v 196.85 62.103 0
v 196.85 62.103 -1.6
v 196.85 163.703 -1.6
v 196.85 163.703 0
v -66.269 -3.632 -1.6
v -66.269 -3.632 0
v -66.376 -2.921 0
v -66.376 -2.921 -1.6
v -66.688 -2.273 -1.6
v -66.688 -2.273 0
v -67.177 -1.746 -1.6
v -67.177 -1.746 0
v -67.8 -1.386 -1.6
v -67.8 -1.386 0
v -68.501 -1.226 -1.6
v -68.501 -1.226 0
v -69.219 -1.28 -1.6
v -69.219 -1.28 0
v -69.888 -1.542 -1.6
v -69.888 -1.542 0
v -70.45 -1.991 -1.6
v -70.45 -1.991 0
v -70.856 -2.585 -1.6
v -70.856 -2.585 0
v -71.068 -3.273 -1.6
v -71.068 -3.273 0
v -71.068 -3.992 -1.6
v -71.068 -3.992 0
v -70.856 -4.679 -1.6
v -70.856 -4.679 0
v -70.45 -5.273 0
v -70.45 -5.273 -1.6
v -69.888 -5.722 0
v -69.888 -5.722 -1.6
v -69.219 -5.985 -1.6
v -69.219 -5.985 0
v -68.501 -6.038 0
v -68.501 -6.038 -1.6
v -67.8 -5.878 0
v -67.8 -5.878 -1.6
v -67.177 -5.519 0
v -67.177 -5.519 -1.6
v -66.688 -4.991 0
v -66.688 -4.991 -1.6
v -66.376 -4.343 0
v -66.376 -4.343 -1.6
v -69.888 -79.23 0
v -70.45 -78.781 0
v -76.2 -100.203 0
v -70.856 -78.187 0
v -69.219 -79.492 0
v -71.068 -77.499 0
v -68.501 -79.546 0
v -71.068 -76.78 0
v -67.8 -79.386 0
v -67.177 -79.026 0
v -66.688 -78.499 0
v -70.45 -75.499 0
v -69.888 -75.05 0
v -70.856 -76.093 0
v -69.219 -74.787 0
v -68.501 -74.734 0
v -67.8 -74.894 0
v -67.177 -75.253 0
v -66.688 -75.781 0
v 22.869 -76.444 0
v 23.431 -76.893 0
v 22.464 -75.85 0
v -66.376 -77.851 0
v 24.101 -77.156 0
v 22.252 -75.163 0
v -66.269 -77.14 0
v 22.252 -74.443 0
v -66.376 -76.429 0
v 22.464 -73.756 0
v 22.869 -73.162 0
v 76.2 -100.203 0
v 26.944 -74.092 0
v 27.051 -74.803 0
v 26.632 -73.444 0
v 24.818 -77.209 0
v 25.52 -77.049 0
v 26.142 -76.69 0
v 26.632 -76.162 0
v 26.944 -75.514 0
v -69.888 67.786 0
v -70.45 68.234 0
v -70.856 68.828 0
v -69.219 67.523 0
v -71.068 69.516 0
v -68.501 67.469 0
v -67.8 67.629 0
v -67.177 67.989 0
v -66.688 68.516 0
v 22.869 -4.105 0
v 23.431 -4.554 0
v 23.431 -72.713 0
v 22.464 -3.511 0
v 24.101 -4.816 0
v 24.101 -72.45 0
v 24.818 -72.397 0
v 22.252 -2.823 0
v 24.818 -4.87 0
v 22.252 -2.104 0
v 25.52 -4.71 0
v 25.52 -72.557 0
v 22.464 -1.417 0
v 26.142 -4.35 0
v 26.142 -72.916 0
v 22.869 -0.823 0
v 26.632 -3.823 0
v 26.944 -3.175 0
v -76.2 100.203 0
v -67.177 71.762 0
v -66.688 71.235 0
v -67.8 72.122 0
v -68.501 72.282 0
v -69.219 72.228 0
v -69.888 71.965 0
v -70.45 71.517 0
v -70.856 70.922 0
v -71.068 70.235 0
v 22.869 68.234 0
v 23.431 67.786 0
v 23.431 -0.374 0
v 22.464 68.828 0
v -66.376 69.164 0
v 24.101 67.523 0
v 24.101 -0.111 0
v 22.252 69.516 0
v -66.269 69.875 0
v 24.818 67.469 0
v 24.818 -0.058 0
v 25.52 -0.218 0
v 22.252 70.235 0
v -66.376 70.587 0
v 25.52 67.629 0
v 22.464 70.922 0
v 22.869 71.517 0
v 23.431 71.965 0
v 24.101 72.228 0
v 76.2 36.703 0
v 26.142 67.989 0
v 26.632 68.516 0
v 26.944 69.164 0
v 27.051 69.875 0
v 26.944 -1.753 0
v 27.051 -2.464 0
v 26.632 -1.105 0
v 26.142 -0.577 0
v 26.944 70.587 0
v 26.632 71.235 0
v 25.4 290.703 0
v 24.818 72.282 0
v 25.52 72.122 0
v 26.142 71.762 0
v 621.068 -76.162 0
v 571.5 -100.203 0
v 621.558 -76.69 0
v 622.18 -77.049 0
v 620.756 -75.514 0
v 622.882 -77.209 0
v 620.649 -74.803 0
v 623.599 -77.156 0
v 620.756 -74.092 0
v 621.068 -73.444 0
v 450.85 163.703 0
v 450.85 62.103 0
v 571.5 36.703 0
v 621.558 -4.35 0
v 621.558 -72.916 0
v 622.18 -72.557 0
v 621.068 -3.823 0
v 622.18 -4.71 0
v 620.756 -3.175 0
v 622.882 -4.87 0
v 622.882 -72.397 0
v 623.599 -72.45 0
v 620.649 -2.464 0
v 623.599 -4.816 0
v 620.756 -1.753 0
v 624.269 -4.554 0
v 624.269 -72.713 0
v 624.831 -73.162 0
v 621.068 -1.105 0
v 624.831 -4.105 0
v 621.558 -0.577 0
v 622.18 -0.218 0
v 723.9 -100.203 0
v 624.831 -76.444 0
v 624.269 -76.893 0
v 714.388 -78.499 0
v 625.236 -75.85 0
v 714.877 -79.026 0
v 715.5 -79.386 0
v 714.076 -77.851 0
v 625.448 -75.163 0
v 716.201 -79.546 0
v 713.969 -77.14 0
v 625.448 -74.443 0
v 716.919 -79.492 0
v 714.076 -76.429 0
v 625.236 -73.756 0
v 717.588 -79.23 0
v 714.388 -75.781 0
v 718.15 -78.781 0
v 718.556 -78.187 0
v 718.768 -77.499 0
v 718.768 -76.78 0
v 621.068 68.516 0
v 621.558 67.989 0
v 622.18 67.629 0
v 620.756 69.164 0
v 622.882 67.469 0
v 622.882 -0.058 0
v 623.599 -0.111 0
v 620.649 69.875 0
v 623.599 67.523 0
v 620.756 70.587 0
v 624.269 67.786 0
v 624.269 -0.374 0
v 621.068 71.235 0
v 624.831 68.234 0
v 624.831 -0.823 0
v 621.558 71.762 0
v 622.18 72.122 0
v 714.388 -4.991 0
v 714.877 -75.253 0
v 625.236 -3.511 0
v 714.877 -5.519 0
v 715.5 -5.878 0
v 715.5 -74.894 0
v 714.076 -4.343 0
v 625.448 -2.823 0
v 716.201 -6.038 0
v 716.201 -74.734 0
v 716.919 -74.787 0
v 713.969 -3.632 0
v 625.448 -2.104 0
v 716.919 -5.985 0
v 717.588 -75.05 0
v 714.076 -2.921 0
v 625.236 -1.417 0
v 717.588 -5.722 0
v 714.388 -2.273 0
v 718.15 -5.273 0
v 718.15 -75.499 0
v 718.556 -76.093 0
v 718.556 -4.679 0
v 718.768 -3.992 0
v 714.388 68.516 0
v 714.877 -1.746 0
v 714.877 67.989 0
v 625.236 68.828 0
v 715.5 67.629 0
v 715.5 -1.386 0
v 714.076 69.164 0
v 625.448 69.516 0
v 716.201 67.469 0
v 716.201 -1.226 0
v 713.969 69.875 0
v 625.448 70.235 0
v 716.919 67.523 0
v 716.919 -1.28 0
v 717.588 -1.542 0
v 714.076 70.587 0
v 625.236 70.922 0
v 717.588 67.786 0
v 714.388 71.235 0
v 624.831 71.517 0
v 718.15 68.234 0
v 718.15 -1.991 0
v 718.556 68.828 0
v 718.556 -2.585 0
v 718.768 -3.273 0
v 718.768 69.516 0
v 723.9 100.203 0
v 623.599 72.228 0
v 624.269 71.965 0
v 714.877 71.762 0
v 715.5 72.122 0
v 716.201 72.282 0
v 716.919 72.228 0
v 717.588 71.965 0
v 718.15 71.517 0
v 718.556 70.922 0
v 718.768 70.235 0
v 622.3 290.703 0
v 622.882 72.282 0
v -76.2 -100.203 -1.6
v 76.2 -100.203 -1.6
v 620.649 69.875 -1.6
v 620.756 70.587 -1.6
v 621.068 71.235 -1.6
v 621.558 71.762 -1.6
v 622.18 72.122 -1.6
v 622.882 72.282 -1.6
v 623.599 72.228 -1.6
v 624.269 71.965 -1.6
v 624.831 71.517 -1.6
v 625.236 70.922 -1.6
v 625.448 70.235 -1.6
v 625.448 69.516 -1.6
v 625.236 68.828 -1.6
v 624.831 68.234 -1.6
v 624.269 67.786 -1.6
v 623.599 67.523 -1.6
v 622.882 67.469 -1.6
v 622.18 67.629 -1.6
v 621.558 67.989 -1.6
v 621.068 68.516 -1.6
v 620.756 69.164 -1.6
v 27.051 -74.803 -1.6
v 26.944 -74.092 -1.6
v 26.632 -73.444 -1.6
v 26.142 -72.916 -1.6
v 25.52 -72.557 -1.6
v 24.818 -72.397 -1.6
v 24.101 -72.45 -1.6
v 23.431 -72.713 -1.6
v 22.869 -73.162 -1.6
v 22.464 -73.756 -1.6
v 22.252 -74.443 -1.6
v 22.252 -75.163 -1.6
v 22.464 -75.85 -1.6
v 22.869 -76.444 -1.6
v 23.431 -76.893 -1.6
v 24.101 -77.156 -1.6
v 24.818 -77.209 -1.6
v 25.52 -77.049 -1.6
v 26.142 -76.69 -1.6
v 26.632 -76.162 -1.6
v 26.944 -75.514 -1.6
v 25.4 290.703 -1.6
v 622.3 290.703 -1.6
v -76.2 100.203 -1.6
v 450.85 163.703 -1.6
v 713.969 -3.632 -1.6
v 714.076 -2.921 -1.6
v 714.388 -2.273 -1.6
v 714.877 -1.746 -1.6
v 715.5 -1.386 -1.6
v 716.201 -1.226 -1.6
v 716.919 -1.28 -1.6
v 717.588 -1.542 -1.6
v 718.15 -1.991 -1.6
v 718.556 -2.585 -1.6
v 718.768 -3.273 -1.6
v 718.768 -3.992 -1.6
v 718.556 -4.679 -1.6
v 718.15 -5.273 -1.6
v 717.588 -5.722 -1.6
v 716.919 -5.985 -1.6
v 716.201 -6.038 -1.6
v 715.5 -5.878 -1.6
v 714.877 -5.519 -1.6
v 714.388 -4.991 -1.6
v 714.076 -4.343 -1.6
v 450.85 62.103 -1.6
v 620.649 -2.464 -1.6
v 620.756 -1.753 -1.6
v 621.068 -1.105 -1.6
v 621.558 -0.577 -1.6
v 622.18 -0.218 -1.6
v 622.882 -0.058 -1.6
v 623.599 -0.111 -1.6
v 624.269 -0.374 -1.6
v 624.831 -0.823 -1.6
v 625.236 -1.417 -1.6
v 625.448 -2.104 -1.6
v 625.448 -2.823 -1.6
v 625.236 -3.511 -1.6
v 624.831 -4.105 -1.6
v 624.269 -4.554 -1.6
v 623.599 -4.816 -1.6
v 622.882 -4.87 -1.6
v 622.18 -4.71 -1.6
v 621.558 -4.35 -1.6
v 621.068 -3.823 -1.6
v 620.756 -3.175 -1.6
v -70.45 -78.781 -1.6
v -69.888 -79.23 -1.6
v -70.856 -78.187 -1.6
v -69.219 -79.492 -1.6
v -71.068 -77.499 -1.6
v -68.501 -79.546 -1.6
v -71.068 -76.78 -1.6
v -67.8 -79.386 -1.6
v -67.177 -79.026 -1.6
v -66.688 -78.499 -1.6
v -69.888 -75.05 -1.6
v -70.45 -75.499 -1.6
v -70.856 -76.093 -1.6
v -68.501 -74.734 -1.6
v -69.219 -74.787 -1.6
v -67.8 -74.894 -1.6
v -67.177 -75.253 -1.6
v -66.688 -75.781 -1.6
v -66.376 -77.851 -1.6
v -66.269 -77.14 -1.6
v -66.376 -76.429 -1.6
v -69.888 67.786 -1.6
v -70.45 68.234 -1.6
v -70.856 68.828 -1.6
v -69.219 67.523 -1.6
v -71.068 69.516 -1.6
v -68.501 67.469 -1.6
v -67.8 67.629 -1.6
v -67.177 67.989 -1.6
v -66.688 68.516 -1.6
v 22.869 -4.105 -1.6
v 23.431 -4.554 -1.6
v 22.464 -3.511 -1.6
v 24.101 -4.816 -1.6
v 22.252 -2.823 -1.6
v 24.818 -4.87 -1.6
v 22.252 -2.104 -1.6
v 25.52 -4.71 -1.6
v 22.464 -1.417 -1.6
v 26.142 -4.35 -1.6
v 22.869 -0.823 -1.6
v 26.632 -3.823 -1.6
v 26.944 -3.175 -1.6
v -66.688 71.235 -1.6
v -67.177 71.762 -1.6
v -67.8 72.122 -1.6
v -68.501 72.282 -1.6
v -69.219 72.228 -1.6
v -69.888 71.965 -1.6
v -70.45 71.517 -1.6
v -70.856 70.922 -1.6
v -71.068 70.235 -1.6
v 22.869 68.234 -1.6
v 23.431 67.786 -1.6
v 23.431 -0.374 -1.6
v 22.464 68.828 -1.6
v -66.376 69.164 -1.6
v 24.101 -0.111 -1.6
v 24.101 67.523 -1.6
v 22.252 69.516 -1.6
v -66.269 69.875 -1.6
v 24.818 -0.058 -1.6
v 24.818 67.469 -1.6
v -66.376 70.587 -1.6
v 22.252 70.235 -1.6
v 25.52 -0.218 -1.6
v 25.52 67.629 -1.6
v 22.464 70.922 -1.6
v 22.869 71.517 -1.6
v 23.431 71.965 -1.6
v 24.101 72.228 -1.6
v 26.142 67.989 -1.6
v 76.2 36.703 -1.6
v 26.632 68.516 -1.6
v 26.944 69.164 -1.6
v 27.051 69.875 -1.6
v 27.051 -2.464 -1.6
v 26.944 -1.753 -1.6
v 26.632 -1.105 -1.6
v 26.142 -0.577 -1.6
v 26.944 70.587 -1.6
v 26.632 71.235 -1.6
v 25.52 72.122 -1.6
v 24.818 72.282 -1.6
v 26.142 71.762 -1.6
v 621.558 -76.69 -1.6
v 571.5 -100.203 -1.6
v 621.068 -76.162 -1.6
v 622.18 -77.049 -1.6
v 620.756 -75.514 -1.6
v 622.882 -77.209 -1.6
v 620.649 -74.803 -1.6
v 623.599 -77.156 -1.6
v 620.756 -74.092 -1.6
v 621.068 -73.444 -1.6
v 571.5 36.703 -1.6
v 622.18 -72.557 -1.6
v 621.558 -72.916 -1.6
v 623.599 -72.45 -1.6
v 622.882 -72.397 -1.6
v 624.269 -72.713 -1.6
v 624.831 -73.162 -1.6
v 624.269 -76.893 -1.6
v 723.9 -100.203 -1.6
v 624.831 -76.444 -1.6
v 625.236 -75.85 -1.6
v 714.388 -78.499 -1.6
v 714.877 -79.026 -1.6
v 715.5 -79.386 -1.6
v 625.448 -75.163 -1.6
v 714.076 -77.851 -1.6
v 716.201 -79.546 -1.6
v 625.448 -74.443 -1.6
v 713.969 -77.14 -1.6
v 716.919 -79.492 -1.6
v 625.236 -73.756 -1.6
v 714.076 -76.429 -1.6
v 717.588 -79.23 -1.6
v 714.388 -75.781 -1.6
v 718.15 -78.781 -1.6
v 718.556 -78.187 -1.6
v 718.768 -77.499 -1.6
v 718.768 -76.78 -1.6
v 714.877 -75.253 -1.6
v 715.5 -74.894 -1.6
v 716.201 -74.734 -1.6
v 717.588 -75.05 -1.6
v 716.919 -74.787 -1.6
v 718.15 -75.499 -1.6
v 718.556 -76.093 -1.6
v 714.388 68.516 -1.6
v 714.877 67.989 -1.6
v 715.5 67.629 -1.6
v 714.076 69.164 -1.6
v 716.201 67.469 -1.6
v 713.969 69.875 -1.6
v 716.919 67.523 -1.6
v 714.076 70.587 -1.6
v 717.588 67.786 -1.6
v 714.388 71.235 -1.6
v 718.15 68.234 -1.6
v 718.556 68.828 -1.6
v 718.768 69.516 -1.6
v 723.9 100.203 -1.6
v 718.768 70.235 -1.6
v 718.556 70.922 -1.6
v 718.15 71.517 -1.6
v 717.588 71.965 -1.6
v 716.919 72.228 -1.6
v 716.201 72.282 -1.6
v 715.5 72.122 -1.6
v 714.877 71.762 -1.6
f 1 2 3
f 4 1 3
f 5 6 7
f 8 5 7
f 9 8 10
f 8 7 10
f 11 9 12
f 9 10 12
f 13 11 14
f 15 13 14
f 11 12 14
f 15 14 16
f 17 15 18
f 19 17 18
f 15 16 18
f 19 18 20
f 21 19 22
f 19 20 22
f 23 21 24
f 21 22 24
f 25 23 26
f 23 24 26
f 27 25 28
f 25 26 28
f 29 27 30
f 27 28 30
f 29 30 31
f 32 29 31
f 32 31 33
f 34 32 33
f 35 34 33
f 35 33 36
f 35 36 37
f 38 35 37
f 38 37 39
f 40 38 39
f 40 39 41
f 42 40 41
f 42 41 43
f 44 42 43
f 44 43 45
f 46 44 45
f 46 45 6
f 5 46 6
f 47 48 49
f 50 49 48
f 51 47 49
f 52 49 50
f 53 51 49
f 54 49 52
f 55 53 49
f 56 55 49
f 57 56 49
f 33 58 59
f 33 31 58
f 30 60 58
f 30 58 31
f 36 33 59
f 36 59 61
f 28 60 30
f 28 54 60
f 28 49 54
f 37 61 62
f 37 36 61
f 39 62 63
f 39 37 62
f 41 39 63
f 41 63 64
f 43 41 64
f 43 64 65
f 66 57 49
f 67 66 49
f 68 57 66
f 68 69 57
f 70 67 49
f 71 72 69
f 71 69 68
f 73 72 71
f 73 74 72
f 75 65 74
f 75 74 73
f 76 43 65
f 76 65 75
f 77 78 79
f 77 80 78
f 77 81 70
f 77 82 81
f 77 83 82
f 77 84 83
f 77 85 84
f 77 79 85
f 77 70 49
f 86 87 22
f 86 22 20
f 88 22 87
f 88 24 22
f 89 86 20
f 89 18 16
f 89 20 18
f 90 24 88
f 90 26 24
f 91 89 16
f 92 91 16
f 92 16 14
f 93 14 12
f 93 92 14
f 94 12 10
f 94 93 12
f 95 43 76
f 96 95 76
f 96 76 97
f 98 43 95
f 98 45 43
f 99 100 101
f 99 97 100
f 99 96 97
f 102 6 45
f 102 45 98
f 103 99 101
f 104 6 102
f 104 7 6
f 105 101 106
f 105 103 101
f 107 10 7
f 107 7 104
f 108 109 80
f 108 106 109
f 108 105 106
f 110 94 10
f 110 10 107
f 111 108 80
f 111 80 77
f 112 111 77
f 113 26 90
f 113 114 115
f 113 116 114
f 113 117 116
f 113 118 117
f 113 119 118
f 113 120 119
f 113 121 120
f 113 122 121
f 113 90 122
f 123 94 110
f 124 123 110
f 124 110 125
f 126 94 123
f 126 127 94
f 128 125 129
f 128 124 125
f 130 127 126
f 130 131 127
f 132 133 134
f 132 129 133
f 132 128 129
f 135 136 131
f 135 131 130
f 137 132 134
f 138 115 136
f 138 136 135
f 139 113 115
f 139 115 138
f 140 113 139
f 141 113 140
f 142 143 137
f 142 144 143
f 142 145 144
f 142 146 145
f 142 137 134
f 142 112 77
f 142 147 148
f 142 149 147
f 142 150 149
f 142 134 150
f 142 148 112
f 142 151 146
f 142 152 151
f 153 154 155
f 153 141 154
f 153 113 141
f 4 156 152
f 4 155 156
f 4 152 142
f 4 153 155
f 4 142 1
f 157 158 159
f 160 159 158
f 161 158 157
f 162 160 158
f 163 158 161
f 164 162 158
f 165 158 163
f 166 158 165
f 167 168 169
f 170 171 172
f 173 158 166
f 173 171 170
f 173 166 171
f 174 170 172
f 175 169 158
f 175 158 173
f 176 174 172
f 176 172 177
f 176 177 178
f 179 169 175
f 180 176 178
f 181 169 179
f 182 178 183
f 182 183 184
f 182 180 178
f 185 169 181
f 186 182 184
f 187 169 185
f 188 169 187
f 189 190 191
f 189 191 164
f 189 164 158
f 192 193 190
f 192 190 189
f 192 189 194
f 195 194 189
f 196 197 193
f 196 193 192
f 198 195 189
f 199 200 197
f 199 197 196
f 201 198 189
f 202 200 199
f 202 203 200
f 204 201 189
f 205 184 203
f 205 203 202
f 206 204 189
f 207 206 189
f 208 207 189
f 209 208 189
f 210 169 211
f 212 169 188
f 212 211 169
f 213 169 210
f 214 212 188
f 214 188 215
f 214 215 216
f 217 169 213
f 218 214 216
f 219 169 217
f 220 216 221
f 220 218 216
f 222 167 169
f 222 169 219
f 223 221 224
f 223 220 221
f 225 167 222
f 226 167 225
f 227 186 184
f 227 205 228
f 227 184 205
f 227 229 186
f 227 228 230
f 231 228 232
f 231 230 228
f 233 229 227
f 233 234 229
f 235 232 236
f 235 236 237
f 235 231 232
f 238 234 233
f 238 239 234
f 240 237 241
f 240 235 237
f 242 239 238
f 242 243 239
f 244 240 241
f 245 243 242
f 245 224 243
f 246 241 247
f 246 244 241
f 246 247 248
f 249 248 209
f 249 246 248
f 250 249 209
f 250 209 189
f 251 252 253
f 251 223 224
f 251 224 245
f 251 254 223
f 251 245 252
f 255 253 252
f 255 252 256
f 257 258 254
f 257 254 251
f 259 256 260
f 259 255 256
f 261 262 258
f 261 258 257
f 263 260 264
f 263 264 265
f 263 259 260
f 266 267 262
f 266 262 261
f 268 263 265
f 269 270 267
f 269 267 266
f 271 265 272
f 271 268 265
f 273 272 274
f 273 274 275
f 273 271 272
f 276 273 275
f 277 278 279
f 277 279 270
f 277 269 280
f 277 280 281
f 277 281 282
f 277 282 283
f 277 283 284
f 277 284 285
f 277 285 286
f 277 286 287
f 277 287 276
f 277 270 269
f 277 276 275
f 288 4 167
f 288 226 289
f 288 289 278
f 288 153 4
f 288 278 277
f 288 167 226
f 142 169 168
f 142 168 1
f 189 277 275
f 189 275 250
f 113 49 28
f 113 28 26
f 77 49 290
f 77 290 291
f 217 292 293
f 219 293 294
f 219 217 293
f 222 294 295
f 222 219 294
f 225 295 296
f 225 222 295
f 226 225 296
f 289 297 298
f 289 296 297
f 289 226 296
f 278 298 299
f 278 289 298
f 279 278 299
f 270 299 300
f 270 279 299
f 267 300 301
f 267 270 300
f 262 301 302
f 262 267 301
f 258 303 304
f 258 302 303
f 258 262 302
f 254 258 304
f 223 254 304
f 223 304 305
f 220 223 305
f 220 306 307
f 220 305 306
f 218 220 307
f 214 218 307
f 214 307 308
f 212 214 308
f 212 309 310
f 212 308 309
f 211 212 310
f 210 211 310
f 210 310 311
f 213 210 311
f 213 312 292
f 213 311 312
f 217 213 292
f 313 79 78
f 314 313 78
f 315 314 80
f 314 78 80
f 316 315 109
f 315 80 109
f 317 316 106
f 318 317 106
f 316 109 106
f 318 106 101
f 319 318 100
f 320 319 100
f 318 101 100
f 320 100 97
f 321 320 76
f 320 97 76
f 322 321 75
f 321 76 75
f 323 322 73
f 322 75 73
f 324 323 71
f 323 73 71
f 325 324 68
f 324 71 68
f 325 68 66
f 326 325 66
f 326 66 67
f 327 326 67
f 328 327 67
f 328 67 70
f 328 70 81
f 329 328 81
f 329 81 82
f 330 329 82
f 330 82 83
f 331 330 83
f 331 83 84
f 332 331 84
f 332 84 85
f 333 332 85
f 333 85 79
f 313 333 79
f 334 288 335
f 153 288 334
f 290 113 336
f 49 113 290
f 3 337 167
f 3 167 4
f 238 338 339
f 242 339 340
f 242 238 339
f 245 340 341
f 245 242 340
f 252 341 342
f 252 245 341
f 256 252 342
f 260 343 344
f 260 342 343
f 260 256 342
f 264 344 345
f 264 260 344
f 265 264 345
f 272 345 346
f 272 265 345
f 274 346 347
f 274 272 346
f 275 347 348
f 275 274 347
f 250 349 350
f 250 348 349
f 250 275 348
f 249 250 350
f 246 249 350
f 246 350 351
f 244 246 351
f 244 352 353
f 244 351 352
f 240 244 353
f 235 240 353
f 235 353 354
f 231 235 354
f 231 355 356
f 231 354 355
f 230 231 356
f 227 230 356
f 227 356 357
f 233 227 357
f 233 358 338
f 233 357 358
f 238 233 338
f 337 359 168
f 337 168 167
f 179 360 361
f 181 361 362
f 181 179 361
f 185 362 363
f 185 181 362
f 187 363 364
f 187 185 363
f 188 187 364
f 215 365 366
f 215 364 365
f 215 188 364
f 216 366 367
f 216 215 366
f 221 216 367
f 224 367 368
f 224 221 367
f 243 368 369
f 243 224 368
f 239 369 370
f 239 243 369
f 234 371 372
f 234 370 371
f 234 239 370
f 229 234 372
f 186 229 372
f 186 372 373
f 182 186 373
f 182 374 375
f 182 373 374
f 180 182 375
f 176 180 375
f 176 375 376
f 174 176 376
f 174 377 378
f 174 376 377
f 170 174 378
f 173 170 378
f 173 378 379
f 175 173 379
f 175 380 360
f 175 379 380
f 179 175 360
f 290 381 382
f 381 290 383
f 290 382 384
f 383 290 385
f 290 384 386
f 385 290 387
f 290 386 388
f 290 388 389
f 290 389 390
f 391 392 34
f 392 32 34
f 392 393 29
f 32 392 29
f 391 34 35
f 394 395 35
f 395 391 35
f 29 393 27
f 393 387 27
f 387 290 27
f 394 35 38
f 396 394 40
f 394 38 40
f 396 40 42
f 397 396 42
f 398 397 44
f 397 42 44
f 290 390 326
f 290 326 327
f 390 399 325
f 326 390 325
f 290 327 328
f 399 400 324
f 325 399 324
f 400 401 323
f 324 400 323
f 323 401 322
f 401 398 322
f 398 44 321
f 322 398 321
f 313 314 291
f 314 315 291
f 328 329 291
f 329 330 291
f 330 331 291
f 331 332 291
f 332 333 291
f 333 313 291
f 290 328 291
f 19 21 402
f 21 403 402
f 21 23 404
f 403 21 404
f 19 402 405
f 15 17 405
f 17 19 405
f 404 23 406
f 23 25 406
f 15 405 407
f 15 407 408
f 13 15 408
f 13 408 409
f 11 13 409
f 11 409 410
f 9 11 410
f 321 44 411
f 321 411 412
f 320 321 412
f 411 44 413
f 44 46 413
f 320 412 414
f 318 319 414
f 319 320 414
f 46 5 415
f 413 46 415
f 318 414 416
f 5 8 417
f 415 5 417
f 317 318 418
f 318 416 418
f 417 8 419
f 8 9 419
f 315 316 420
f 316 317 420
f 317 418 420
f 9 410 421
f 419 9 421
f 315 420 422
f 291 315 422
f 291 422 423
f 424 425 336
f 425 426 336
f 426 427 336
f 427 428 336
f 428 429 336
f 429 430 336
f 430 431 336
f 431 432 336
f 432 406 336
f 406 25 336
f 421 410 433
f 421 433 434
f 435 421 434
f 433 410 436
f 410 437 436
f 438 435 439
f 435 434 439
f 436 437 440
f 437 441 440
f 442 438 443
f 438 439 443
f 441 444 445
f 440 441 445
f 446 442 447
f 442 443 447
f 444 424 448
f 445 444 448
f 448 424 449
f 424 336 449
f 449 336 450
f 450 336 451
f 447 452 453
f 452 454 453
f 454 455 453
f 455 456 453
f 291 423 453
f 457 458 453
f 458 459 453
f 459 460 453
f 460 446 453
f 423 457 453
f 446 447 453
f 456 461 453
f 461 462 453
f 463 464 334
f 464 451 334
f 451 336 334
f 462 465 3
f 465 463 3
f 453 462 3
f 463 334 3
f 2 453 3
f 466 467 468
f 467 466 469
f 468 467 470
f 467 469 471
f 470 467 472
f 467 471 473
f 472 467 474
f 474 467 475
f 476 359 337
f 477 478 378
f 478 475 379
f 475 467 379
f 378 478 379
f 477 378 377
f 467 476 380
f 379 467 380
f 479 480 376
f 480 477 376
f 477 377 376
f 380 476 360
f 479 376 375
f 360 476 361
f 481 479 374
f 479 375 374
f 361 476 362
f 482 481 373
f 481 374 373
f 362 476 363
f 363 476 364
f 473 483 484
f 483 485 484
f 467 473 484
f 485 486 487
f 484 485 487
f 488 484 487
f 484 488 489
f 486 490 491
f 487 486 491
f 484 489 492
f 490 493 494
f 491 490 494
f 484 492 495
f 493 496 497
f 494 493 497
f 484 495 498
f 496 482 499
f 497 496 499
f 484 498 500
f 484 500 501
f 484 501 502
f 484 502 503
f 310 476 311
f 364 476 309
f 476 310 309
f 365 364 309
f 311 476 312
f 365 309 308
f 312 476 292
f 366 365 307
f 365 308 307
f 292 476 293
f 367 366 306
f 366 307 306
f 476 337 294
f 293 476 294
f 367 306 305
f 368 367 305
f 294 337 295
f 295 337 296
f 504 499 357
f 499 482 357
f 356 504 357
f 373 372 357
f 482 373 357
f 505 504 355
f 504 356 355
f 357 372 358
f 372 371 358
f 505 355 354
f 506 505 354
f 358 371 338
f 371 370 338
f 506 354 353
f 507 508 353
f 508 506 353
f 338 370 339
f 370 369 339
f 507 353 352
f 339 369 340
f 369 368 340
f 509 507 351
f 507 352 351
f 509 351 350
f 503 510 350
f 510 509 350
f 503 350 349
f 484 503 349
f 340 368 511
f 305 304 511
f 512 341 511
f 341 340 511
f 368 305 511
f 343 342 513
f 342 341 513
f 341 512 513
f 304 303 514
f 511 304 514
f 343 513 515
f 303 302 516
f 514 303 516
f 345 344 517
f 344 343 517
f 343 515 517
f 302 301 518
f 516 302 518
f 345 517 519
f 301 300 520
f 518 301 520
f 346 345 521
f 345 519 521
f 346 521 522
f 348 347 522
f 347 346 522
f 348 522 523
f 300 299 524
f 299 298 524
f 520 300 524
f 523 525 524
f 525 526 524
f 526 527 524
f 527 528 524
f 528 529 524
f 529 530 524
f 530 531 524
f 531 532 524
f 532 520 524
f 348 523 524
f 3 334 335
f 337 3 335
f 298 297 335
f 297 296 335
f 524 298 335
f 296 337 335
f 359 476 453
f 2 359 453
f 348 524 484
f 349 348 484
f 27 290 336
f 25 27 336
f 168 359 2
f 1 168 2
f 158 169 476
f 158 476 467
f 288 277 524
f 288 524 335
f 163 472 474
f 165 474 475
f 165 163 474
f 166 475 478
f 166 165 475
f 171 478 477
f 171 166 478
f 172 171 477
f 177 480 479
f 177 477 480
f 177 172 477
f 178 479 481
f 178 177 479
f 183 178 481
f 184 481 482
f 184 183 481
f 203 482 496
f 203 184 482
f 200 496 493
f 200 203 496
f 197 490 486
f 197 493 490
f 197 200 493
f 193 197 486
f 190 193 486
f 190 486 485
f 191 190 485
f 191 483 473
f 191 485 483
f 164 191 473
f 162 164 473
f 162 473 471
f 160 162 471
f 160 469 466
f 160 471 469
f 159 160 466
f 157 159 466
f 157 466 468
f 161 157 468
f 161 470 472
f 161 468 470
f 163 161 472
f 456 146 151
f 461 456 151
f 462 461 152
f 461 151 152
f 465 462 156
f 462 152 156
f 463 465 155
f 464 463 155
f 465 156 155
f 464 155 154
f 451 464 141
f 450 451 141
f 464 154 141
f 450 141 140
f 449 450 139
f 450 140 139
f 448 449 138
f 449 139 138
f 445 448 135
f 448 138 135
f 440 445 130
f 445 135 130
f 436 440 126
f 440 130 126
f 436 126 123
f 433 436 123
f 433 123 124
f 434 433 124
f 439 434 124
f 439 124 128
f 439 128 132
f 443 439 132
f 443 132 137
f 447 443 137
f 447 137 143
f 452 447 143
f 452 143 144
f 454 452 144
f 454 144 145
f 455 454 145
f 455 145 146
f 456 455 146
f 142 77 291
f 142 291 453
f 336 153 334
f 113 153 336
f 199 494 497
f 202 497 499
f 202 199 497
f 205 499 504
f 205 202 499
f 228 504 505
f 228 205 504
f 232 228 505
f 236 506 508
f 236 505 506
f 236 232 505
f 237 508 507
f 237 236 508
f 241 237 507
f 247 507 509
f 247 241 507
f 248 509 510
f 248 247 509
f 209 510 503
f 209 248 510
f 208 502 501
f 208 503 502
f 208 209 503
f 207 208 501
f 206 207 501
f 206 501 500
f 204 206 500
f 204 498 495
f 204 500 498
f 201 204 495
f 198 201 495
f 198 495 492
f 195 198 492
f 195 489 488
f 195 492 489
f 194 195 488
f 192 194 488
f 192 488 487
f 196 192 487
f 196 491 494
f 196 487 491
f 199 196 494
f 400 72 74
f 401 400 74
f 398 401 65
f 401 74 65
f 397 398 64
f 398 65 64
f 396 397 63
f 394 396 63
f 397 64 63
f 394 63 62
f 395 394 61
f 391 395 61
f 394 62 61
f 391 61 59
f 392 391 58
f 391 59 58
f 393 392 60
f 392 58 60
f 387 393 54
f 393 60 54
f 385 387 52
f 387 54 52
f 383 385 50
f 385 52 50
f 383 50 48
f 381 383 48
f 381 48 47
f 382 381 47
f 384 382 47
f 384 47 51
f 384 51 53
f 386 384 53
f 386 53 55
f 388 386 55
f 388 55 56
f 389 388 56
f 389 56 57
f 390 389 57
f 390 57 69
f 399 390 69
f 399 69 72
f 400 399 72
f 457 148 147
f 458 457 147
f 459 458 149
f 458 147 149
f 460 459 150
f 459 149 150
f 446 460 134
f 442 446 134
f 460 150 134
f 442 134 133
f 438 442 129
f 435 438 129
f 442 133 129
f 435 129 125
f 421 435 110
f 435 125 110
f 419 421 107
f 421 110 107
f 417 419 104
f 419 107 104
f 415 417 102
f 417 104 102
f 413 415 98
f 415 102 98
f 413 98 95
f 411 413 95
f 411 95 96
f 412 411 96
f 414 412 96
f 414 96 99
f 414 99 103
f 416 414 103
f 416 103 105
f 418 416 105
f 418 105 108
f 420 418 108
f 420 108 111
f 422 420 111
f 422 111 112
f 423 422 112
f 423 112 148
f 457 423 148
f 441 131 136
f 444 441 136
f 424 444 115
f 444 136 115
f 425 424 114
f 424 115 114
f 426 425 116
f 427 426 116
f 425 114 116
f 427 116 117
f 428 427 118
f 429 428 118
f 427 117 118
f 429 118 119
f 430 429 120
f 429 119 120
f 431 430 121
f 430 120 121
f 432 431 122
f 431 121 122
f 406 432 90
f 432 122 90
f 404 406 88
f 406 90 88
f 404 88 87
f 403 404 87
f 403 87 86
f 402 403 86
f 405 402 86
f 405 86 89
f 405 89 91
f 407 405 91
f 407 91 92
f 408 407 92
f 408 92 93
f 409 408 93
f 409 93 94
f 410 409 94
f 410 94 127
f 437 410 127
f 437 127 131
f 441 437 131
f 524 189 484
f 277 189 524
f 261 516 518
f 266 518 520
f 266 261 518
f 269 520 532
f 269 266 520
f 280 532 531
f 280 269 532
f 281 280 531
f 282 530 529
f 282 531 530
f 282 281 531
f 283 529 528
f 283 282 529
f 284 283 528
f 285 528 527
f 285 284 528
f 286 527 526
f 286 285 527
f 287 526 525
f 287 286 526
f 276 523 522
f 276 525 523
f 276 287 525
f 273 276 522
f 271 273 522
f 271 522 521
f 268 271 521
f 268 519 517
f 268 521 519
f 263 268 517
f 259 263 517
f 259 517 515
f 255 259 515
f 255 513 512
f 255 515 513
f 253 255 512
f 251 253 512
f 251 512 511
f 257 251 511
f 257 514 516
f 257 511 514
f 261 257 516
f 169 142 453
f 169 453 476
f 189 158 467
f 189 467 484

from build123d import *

# Parameters (mm, degrees)
BASE_FLANGE1_DEPTH = 1.6002
SKETCH2_R          = 2.413
CUT_EXTRUDE1_DEPTH = 781.091023438
SKETCH3_W          = 254
SKETCH3_H          = 101.6
CUT_EXTRUDE2_DEPTH = 781.091023438


# Sheet-metal steps are written as plain solids
with BuildPart() as part:
    # Sketch1 → Base-Flange1 (new body)
    with BuildSketch(Plane.XY):
        Polygon((-76.2, -100.203), (76.2, -100.203), (76.2, 36.703), (571.5, 36.703), (571.5, -100.203), (723.9, -100.203), (723.9, 100.203), (622.3, 290.703), (25.4, 290.703), (-76.2, 100.203), align=None)
    extrude(amount=-BASE_FLANGE1_DEPTH)

    # Sketch2 → Cut-Extrude1 (cut, through all)
    with BuildSketch(Plane.XY):
        with Locations((24.637999896, 69.8754)):
            Circle(SKETCH2_R)
        with Locations((-68.6816, 69.8754)):
            Circle(SKETCH2_R)
        with Locations((24.637999896, -2.4638)):
            Circle(SKETCH2_R)
        with Locations((-68.6816, -3.6322)):
            Circle(SKETCH2_R)
        with Locations((-68.6816, -77.1398)):
            Circle(SKETCH2_R)
        with Locations((24.637999896, -74.803)):
            Circle(SKETCH2_R)
    cut_extrude1 = extrude(amount=-CUT_EXTRUDE1_DEPTH, mode=Mode.SUBTRACT)

    # Mirror1: Cut-Extrude1 across plane
    add(cut_extrude1.mirror(Plane.ZY.offset(-323.85)), mode=Mode.SUBTRACT)

    # Sketch3 → Cut-Extrude2 (cut, through all)
    with BuildSketch(Plane(origin=(0, 0, -1.6002), x_dir=(-1, 0, 0), z_dir=(0, 0, -1))):
        with Locations((-323.85, 112.903)):
            Rectangle(SKETCH3_W, SKETCH3_H)
    extrude(amount=-CUT_EXTRUDE2_DEPTH, mode=Mode.SUBTRACT)


solid = part.part
